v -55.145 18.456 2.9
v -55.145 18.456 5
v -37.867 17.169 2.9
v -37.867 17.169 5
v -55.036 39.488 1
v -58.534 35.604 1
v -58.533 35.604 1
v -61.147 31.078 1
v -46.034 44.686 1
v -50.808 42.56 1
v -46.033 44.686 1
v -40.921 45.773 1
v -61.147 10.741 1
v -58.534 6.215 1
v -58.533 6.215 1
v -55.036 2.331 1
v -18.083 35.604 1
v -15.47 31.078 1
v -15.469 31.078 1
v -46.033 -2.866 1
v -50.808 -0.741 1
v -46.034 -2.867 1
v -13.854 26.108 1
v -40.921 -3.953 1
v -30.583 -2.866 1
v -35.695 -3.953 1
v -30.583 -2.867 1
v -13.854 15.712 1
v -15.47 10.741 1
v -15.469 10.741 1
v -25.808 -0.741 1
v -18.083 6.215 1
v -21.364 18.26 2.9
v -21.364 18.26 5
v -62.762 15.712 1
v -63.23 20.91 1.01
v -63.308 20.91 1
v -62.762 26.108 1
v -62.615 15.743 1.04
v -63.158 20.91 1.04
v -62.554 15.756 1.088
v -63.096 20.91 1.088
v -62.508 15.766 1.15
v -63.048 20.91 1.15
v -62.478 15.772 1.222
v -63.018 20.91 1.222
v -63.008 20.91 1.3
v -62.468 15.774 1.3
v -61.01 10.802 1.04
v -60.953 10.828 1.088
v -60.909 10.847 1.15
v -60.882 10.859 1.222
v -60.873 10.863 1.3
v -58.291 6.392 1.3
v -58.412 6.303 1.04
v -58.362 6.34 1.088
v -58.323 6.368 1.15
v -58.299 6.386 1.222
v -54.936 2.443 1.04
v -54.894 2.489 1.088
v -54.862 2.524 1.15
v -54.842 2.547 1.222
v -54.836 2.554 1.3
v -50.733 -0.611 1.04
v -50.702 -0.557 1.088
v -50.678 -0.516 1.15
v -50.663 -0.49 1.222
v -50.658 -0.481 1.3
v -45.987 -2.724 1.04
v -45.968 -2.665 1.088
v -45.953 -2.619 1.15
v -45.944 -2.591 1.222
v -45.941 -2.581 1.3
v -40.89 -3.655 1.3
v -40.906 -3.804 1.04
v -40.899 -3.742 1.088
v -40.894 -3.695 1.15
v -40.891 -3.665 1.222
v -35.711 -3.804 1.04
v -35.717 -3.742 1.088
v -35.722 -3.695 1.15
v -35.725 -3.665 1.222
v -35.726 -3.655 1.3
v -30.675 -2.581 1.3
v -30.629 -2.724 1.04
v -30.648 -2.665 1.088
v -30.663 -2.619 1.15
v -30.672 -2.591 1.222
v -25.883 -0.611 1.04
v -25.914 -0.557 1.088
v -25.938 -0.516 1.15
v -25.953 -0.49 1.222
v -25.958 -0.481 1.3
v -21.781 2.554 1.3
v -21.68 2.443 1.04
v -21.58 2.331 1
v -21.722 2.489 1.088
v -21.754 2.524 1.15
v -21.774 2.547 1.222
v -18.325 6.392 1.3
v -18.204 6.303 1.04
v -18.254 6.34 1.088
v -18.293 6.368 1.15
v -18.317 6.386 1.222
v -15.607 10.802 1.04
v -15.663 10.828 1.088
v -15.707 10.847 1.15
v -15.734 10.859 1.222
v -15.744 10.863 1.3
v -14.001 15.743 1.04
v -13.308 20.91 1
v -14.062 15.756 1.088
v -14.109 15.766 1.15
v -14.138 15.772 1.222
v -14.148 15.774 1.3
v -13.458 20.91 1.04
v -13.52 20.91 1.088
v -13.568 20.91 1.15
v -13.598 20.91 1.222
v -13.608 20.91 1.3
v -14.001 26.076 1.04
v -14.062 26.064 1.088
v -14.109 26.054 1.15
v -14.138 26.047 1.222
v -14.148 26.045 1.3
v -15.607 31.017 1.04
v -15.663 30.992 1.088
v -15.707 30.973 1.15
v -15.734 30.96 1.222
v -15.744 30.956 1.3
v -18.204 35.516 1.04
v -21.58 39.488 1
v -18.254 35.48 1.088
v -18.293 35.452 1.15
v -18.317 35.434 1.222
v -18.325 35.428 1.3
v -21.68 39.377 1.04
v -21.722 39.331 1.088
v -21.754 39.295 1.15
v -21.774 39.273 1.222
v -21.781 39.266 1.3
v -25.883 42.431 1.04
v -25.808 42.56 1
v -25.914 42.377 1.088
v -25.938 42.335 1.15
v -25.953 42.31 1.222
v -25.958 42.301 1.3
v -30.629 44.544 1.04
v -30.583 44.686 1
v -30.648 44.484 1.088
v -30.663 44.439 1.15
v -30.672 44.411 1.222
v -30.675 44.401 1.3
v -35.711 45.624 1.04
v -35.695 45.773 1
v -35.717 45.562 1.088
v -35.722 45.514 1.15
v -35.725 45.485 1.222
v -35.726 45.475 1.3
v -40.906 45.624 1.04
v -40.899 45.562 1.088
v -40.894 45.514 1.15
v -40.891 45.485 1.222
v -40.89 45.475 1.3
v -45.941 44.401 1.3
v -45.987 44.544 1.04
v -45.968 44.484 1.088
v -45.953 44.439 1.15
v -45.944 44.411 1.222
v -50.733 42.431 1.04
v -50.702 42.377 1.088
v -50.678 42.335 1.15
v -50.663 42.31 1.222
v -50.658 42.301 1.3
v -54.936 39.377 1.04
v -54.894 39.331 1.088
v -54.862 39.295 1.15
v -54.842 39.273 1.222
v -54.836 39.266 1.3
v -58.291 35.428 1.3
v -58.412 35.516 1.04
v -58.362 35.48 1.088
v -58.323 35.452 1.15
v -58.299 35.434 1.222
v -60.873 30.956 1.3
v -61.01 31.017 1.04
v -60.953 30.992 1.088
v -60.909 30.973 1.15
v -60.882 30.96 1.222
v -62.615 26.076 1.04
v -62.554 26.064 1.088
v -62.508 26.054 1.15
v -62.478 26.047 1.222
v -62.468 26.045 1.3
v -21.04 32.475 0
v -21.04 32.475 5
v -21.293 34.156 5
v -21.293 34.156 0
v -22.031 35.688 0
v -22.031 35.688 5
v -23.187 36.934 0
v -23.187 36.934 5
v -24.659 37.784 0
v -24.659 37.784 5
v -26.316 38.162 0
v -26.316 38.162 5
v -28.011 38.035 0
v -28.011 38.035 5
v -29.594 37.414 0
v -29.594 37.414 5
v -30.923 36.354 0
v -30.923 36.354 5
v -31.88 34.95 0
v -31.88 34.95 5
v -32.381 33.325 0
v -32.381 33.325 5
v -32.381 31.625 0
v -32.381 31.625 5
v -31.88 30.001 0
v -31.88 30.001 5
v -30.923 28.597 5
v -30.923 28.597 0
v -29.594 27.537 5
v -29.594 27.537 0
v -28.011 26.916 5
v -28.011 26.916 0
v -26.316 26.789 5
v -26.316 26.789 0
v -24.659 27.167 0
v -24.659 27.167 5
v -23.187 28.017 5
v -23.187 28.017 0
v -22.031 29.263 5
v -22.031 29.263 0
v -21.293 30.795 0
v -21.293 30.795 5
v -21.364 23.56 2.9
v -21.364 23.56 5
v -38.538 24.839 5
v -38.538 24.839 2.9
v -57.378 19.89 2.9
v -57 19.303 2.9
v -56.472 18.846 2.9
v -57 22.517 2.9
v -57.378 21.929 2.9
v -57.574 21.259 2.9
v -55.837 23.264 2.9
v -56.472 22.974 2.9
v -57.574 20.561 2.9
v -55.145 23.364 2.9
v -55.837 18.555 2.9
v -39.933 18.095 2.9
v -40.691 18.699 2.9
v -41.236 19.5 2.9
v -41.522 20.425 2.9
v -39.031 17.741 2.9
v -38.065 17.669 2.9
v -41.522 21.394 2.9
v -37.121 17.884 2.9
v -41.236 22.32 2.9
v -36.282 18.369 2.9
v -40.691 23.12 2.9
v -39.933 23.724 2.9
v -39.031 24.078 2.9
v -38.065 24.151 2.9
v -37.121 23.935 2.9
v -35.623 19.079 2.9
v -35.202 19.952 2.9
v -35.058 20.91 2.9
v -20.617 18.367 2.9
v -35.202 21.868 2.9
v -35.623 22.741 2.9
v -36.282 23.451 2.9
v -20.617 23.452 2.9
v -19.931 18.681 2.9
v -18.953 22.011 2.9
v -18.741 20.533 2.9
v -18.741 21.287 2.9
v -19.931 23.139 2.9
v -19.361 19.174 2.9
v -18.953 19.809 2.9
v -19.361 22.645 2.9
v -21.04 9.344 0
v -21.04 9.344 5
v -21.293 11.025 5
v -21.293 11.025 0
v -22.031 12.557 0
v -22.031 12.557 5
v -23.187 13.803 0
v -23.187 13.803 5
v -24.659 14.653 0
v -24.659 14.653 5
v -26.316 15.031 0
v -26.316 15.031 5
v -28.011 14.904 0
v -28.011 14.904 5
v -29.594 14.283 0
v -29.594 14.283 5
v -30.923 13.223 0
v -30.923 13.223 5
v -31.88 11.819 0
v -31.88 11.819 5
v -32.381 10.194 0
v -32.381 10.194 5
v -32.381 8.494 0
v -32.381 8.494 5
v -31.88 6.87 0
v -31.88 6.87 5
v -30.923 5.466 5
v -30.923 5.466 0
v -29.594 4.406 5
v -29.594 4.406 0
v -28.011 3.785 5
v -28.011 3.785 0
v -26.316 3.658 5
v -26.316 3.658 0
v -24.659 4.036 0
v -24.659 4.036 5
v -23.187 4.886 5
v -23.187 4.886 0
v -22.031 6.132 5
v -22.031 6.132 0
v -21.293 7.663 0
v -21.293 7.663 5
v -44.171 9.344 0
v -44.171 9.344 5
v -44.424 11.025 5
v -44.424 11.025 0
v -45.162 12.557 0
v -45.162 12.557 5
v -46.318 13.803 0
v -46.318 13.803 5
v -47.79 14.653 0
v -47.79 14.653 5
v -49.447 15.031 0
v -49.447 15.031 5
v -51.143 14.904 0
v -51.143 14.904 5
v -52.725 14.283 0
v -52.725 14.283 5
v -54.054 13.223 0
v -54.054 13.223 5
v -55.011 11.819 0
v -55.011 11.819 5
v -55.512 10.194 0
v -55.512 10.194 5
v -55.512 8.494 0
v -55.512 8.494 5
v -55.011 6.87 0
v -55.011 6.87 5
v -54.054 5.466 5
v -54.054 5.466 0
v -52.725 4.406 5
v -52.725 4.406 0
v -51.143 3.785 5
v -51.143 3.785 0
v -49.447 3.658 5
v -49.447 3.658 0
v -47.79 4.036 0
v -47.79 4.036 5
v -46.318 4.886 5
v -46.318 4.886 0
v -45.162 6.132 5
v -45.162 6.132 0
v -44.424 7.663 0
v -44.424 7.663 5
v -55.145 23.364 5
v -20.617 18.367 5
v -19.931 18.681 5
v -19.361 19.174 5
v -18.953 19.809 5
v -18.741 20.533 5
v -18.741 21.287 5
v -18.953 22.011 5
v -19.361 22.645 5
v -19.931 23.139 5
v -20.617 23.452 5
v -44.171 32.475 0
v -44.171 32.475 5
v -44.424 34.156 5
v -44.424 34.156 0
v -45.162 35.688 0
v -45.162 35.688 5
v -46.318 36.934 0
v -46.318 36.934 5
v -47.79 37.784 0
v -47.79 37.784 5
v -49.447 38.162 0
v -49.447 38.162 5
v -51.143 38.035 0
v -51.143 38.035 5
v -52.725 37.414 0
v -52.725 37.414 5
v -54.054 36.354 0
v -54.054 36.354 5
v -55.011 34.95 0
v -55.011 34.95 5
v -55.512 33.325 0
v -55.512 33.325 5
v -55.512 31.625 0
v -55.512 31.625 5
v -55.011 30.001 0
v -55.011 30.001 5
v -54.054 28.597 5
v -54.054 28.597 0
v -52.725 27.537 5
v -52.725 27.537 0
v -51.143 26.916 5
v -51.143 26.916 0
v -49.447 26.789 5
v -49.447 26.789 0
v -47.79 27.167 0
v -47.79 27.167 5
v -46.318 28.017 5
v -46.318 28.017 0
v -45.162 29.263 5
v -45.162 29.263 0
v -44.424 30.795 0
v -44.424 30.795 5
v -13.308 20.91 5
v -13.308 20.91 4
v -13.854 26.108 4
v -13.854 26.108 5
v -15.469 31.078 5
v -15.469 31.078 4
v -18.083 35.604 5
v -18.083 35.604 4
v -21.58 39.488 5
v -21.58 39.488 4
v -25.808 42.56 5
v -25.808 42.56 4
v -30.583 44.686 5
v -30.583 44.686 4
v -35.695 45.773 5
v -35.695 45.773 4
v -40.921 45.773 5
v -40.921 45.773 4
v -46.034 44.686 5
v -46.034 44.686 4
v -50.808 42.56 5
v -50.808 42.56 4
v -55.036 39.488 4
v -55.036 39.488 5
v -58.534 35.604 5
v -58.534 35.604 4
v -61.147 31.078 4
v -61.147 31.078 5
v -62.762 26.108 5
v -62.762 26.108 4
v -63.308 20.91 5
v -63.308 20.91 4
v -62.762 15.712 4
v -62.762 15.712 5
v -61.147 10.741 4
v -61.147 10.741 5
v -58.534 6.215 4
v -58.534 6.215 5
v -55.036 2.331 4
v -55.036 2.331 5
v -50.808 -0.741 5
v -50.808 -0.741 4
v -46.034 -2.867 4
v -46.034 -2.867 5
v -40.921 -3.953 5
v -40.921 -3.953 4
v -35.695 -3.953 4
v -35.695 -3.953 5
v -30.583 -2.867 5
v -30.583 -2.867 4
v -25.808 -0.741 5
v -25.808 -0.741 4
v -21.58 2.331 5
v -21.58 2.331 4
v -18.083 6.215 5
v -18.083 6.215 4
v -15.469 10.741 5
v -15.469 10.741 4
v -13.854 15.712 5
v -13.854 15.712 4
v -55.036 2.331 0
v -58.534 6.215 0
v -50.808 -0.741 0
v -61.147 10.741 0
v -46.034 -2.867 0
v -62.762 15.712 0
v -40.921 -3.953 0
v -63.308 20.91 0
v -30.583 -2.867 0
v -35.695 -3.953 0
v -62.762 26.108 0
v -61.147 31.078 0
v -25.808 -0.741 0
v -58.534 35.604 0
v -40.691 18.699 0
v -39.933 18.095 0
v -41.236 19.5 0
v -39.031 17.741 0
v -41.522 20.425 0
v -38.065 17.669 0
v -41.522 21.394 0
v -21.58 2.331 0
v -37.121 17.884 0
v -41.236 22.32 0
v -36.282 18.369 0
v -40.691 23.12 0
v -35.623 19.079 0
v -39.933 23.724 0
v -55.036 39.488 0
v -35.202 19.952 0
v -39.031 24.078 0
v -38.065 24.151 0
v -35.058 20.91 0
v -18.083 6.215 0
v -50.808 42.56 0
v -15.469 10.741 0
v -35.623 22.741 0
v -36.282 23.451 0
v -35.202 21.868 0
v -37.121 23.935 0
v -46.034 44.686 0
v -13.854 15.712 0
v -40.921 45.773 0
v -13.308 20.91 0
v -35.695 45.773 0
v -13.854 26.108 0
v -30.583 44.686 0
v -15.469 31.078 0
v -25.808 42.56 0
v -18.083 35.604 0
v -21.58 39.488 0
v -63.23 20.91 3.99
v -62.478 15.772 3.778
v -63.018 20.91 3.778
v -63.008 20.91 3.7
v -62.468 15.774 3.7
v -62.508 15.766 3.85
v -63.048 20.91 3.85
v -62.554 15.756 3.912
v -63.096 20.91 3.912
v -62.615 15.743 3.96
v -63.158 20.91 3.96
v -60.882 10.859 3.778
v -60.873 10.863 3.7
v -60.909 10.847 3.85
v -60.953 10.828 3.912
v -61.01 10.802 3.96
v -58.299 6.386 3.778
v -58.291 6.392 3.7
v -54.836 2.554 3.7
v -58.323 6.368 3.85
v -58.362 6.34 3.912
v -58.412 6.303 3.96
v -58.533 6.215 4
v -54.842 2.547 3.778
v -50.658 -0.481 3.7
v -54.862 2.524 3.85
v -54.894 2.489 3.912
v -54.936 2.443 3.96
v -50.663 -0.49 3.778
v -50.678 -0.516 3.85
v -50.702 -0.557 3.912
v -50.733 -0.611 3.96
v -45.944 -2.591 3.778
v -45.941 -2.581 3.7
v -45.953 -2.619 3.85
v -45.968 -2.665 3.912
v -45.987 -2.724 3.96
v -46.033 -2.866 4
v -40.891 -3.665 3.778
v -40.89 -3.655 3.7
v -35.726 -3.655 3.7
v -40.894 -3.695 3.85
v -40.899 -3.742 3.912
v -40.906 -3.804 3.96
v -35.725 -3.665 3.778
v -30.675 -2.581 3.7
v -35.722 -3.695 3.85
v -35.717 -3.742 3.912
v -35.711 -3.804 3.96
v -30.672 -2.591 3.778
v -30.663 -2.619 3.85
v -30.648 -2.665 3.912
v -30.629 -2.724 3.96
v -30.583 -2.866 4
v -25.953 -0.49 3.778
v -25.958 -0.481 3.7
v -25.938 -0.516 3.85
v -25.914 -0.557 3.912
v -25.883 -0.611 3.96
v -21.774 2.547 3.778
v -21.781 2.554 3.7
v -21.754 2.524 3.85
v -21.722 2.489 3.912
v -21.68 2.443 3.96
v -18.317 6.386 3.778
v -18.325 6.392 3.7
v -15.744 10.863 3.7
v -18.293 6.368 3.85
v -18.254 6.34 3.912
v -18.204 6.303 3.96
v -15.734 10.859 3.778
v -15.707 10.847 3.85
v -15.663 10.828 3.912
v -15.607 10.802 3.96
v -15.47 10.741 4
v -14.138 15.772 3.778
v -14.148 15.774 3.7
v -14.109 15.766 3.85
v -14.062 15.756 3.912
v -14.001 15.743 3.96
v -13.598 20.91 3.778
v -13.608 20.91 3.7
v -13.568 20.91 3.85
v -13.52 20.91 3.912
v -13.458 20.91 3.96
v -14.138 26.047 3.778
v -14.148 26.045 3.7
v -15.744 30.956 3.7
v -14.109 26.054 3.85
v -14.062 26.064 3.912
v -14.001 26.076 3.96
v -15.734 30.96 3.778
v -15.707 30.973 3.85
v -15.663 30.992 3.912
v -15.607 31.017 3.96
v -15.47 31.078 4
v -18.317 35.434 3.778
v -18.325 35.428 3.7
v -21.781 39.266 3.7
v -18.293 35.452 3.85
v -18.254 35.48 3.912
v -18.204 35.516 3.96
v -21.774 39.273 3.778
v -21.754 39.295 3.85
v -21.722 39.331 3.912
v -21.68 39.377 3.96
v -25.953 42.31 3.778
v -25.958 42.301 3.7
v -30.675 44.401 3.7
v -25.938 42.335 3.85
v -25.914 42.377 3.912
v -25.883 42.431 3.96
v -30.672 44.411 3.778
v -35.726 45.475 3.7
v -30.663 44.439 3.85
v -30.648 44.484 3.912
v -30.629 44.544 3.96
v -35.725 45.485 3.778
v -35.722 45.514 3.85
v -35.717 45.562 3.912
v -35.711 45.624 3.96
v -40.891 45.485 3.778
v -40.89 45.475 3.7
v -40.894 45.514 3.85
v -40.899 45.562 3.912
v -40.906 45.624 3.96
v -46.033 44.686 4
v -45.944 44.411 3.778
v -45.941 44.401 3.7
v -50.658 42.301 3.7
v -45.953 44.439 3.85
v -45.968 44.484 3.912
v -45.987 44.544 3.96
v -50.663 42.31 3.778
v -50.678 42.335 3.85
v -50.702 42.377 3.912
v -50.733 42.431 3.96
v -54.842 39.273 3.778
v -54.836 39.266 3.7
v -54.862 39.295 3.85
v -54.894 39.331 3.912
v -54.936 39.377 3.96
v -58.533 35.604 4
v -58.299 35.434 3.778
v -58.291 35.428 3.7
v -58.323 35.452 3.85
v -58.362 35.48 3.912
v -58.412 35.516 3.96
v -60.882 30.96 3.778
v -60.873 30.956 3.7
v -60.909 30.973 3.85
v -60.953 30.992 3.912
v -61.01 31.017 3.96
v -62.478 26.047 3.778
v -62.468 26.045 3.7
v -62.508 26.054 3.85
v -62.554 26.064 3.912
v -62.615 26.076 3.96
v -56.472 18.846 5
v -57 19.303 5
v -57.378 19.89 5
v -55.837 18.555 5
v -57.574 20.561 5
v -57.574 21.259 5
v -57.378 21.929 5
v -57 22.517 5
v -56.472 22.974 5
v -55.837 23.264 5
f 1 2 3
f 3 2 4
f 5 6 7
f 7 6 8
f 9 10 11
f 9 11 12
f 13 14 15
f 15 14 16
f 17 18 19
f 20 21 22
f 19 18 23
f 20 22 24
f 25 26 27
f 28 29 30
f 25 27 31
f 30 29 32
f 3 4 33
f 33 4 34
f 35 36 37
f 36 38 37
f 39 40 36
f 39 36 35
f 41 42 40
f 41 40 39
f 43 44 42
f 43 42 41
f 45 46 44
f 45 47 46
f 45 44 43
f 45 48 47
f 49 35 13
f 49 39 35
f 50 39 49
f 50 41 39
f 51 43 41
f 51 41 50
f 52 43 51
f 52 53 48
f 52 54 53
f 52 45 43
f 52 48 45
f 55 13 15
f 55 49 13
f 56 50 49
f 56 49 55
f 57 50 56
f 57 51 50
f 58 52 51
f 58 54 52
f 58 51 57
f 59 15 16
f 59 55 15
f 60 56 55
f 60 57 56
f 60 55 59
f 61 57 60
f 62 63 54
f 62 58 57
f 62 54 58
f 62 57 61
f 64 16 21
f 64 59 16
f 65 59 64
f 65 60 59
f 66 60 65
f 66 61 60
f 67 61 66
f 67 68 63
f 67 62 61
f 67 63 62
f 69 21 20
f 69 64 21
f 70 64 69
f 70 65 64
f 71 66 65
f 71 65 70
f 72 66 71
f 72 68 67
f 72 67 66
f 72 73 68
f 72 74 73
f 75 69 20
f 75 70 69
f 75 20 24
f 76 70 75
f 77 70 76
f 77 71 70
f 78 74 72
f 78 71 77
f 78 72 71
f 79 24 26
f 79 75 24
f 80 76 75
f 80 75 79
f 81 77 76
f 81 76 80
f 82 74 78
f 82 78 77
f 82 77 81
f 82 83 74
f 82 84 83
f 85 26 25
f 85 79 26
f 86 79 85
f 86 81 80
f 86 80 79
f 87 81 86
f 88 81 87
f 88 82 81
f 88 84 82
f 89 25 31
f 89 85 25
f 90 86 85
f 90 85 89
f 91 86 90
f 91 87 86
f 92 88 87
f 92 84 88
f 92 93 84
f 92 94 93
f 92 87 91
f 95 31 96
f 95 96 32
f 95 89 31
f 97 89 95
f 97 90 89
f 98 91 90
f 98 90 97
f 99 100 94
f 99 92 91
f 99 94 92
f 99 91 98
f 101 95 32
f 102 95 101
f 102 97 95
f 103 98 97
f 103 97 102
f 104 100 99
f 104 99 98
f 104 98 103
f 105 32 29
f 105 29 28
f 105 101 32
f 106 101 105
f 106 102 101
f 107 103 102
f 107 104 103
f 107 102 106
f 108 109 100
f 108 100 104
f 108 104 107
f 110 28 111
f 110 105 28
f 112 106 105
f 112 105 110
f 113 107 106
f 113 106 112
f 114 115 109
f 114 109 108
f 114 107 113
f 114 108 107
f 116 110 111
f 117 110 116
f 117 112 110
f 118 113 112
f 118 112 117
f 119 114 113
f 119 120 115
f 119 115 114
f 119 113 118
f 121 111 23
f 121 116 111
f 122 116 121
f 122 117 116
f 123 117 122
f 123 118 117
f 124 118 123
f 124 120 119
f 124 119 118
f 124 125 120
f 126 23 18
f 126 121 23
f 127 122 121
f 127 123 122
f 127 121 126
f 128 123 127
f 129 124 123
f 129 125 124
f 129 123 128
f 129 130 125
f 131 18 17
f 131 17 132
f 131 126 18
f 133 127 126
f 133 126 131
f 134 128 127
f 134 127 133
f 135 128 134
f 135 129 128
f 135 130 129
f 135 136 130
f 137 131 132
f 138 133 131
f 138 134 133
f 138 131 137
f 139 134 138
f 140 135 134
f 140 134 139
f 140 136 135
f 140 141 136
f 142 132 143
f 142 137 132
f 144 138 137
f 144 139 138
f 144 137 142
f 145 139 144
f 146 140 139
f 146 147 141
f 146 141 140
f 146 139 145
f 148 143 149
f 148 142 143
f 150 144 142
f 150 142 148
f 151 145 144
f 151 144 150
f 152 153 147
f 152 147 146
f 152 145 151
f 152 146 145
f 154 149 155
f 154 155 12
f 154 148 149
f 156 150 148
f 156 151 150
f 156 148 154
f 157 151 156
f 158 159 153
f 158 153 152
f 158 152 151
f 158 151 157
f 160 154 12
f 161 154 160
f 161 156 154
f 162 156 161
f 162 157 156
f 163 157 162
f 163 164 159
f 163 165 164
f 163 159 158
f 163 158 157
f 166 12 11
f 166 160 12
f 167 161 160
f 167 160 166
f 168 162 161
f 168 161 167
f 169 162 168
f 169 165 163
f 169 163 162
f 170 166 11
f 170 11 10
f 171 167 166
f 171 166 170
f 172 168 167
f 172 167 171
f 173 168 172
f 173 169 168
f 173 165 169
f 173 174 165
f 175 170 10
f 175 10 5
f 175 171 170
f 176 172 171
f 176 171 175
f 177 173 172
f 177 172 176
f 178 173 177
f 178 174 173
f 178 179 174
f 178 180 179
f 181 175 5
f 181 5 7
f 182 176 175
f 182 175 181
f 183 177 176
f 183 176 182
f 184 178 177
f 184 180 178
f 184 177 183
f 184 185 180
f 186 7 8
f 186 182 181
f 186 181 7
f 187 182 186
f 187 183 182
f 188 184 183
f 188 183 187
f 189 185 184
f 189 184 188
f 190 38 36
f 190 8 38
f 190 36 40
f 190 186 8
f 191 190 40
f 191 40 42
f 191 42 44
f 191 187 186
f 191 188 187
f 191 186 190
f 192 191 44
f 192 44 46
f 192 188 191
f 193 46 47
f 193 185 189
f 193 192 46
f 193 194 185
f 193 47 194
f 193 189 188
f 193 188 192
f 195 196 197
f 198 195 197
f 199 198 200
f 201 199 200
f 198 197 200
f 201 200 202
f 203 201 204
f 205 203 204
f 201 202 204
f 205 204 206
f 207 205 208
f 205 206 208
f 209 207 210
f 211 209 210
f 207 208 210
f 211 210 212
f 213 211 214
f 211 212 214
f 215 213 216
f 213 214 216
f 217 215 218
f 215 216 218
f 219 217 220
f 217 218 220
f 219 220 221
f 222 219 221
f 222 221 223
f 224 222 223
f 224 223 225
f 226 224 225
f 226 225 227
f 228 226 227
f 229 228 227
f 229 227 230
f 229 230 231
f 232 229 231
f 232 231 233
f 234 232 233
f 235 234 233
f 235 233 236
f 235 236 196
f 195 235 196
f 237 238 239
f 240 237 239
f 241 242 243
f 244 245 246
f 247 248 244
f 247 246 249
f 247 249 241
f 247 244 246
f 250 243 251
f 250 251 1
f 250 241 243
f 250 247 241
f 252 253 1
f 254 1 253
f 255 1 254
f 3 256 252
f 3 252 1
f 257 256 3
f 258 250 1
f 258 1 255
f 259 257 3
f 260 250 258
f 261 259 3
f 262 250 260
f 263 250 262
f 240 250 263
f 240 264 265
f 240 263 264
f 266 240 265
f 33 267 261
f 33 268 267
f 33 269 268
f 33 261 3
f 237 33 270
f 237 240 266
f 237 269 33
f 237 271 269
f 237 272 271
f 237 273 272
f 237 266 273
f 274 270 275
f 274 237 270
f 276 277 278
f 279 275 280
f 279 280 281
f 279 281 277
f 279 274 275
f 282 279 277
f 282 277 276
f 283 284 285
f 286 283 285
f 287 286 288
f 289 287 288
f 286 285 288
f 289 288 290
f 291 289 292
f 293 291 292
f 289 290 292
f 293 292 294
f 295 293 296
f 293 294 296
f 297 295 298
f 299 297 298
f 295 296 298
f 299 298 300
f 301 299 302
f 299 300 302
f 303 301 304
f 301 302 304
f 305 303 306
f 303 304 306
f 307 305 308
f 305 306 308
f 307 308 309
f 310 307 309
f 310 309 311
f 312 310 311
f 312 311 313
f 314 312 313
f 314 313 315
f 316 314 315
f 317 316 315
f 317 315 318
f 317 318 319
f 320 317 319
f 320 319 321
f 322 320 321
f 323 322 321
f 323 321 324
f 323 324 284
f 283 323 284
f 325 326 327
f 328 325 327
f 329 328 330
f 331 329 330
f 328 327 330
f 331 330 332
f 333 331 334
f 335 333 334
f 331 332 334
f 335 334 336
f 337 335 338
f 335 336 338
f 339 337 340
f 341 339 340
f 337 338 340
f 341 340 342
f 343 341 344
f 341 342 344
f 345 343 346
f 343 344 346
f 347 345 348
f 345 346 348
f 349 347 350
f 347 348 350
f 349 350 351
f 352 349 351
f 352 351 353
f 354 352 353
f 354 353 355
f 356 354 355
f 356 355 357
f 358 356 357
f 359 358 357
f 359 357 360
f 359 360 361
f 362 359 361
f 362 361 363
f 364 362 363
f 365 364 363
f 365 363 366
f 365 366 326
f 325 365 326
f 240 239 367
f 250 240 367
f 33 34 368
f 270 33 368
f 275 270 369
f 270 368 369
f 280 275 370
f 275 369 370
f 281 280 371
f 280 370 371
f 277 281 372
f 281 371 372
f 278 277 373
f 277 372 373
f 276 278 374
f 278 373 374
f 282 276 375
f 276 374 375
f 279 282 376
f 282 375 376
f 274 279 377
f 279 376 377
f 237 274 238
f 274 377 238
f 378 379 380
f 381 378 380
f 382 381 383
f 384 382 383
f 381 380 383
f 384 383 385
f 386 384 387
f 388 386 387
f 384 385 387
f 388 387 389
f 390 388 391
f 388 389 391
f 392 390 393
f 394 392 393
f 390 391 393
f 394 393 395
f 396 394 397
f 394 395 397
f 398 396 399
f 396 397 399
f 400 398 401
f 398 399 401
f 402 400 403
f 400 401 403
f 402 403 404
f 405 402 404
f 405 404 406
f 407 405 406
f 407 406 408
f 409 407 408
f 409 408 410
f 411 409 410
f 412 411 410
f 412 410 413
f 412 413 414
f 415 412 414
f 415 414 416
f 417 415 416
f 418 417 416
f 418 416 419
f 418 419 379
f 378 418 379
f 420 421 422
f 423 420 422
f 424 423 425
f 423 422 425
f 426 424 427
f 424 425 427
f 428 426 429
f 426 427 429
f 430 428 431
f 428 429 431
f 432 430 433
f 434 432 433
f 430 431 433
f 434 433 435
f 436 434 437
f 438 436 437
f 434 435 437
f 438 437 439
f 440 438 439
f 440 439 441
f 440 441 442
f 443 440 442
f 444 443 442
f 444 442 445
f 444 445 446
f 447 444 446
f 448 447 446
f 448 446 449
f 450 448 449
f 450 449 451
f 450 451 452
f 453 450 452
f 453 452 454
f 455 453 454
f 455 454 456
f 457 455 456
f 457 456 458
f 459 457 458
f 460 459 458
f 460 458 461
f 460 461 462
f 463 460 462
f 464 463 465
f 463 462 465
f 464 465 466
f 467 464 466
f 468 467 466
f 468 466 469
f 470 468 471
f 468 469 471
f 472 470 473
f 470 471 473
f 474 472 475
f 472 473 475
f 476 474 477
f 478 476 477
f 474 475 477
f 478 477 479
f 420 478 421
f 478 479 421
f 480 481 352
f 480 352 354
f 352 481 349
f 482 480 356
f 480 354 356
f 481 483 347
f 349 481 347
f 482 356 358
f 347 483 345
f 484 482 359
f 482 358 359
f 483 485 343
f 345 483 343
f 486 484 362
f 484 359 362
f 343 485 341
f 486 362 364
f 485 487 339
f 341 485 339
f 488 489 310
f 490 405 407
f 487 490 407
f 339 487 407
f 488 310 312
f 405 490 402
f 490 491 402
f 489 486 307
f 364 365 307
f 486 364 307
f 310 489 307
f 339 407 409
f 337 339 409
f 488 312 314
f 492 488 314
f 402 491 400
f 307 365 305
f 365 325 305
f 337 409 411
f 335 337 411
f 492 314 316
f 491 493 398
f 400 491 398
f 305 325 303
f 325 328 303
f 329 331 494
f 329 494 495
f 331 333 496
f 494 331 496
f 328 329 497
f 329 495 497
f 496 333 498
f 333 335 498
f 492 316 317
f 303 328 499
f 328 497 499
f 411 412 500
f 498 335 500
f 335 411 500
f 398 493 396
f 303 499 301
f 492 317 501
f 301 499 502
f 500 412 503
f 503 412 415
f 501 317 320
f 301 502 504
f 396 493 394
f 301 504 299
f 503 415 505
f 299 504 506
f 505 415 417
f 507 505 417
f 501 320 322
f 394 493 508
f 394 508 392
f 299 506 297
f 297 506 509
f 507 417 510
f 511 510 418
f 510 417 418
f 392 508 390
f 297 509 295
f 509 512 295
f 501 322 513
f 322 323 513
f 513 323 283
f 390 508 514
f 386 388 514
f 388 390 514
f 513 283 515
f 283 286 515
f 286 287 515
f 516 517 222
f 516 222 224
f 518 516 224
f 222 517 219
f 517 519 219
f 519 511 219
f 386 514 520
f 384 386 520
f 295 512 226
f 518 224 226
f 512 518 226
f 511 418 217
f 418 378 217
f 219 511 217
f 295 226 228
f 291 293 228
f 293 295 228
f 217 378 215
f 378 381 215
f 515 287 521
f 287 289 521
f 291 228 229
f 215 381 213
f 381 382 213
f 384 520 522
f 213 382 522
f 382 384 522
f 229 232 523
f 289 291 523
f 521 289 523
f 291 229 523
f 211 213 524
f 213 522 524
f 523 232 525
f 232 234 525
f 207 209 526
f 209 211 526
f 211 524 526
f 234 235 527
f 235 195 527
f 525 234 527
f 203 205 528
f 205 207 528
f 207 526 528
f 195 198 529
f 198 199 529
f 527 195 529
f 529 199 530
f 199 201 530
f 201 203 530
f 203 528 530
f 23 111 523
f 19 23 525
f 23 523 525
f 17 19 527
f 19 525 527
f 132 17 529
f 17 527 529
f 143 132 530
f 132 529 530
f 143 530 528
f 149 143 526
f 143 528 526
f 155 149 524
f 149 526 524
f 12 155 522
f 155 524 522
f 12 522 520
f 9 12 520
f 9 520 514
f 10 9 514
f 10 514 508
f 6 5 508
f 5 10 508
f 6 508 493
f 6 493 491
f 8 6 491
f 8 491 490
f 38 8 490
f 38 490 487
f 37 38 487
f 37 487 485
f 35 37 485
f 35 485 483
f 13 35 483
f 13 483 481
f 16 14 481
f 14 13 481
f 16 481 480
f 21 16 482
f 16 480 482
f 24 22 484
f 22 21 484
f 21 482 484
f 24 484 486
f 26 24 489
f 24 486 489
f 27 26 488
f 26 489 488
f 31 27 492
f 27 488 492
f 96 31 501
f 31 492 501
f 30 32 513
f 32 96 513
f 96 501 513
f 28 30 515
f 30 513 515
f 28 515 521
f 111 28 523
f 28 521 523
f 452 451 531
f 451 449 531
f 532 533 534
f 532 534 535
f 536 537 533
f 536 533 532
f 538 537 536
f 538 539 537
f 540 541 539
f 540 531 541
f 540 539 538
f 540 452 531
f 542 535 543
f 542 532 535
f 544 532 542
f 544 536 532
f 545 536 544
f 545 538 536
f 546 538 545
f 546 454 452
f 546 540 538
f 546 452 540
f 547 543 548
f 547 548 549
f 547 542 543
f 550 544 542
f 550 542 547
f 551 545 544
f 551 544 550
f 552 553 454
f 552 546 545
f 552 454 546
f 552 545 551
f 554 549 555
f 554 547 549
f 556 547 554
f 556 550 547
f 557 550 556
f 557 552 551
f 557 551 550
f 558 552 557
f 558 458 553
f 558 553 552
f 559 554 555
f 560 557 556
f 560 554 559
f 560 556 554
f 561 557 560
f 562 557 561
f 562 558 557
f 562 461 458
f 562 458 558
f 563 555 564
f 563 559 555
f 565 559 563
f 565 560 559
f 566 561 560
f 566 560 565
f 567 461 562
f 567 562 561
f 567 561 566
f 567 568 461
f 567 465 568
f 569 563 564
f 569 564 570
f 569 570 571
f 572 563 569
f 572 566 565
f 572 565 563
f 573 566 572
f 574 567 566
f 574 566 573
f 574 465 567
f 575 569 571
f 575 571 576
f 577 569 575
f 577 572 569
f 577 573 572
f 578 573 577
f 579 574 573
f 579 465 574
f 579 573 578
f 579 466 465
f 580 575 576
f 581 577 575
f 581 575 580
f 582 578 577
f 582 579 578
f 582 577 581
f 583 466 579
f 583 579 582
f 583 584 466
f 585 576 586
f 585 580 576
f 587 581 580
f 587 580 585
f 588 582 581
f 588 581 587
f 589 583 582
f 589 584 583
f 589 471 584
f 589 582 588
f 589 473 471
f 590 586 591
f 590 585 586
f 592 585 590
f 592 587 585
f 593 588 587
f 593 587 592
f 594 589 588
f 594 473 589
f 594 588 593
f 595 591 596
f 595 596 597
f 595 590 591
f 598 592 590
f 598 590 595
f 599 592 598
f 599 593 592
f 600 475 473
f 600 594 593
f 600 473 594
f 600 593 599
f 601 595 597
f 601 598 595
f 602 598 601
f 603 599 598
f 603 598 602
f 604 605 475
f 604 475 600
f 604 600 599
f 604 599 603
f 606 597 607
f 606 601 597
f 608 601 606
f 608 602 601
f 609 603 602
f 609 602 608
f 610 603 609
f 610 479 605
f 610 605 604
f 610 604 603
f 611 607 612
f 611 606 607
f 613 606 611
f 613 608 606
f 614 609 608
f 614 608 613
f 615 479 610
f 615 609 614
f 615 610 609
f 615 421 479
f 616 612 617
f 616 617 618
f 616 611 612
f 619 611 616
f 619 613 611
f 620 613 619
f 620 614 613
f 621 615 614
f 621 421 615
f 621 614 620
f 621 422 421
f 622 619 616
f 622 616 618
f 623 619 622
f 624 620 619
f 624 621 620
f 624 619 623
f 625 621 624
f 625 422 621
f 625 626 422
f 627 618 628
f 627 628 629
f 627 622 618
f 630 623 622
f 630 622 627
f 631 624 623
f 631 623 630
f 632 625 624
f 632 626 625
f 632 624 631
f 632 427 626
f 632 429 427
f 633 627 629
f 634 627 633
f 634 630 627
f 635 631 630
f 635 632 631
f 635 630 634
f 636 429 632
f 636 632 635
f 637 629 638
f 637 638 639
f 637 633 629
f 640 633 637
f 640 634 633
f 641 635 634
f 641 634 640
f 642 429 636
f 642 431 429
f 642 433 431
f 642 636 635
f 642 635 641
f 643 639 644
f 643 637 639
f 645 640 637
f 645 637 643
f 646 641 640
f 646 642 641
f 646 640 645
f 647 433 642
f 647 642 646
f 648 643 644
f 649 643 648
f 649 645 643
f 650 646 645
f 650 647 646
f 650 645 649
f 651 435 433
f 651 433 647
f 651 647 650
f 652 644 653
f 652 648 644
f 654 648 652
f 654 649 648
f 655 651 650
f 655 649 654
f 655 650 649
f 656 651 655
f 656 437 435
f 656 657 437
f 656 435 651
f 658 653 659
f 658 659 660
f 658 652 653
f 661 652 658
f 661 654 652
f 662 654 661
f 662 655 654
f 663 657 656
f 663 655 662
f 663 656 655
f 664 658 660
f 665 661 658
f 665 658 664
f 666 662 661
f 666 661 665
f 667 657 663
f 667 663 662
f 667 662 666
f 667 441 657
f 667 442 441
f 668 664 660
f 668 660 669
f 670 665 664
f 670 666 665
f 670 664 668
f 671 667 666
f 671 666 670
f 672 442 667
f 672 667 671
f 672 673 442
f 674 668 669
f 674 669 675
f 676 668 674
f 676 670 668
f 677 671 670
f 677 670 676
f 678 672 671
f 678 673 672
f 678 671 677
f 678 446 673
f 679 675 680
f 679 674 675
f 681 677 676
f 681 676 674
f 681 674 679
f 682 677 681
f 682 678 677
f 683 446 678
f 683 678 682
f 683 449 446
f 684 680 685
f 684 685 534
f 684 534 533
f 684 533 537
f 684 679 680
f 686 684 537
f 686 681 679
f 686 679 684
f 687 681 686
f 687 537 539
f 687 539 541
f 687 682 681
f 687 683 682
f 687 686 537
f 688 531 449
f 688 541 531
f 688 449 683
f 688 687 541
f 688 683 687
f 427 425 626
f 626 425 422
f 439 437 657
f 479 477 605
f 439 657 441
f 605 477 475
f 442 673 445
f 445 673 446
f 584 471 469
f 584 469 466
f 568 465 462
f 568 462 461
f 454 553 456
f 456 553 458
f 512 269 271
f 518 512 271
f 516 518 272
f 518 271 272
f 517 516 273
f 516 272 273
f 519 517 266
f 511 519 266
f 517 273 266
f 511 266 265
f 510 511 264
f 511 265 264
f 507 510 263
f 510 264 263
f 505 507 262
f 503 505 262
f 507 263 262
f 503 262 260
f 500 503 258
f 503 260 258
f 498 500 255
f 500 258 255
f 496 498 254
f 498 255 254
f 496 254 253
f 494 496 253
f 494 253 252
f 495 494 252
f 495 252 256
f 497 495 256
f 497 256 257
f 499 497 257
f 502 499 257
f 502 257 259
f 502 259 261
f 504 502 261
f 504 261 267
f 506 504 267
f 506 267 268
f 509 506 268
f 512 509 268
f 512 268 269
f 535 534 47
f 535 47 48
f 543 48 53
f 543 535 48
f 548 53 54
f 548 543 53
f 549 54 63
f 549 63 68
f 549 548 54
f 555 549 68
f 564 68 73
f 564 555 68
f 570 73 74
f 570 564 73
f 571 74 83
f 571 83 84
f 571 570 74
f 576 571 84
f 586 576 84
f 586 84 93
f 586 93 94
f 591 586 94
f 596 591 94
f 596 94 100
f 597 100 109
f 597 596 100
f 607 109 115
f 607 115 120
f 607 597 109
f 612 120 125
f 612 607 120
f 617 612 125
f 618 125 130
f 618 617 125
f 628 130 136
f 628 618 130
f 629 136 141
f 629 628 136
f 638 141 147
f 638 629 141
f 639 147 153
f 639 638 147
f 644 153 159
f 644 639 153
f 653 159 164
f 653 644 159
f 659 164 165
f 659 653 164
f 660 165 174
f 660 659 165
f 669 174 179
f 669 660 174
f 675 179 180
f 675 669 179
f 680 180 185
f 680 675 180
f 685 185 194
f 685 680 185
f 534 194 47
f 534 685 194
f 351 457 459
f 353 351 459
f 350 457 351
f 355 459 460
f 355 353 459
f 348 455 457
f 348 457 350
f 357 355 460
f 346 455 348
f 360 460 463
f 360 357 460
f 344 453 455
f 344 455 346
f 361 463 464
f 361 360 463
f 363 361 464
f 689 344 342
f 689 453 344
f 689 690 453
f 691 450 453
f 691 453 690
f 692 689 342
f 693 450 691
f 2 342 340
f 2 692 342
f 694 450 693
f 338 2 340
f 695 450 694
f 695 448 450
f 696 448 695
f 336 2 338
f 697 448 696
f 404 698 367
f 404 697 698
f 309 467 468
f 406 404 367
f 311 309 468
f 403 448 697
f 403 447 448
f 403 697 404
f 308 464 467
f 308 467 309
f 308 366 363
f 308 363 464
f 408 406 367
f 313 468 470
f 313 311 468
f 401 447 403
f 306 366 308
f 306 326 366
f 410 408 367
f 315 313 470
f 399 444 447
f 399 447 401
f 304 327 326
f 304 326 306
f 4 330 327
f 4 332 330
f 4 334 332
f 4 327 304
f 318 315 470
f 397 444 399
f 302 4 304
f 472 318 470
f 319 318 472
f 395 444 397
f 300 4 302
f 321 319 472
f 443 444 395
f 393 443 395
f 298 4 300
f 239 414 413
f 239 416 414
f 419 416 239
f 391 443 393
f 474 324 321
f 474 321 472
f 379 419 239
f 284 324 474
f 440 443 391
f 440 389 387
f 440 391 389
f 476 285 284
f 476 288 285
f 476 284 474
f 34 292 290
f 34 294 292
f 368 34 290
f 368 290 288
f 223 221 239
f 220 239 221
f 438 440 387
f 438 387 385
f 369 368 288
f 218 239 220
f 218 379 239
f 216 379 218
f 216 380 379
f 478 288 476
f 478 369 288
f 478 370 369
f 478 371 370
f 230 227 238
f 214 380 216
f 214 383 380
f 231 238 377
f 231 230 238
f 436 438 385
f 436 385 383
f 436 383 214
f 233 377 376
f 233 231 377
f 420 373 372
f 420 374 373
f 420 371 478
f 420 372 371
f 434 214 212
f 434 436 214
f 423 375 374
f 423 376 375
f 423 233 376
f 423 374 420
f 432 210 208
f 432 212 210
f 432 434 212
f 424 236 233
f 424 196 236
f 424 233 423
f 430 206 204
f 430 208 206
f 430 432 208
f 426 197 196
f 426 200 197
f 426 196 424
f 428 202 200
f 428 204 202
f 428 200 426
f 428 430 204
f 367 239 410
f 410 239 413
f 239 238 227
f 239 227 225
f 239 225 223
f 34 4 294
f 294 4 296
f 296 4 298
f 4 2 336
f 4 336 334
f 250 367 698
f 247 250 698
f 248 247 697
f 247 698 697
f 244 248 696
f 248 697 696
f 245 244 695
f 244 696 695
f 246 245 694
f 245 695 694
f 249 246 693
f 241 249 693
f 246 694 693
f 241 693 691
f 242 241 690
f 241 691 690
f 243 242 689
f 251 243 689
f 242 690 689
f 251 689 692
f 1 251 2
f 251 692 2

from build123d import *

# Parameters (mm, degrees)
SKETCH1_R           = 25
BOSS_EXTRUDE1_DEPTH = 5
FILLET1_R           = 0.3
CUT_EXTRUDE1_DEPTH  = 2.1
SKETCH15_R          = 3.25
CUT_EXTRUDE2_DEPTH  = 10.1
SKETCH18_R          = 5.702447769
CUT_EXTRUDE4_DEPTH  = 10.1


with BuildPart() as part:
    # Sketch1 → Boss-Extrude1 (new body)
    with BuildSketch(Plane.XY):
        with Locations((-38.308088976, 20.909831899)):
            Circle(SKETCH1_R)
    extrude(amount=BOSS_EXTRUDE1_DEPTH)

    # Sketch12 → Cut-Revolve1 (revolve, cut)
    with BuildSketch(Plane.ZY.offset(38.308088976), mode=Mode.PRIVATE) as cut_revolve1_sk:
        Polygon((2.5, 45.909831899), (4, 45.909831899), (4, 45.609831899), (2.5, 45.609831899), (1, 45.609831899), (1, 45.909831899), align=None)
    revolve(cut_revolve1_sk.sketch.rotate(Axis((-38.308088976, 20.909831899, 0), (0, 0, 1)), 90), axis=Axis((-38.308088976, 20.909831899, 0), (0, 0, 1)), mode=Mode.SUBTRACT)

    # Fillet1
    fillet1_edges = [part.edges().sort_by_distance(p)[0] for p in [
        (-13.608088976, 20.909831899, 1),
        (-13.608088976, 20.909831899, 4),
    ]]
    fillet(fillet1_edges, radius=FILLET1_R - 0.0001)  # a hair under: the kernel refuses the full size

    # Sketch13 → Cut-Extrude1 (cut)
    with BuildSketch(Plane.XY.offset(5)):
        with BuildLine():
            Line((-38.537840804, 24.839400282), (-55.145400599, 23.363683745))
            ThreePointArc((-55.145400599, 23.363683745), (-57.599252444, 20.909831899), (-55.145400599, 18.455980054))
            Line((-55.145400599, 18.455980054), (-37.86715674, 17.168664797))
            Line((-37.86715674, 17.168664797), (-21.363574888, 18.259831899))
            ThreePointArc((-21.363574888, 18.259831899), (-18.713574888, 20.909831899), (-21.363574888, 23.559831899))
            Line((-21.363574888, 23.559831899), (-38.537840804, 24.839400282))
        make_face()
    extrude(amount=-CUT_EXTRUDE1_DEPTH, mode=Mode.SUBTRACT)

    # Sketch15 → Cut-Extrude2 (cut)
    with BuildSketch(Plane.XY.offset(2.9)):
        with Locations((-38.308088976, 20.909831899)):
            Circle(SKETCH15_R)
    extrude(amount=-CUT_EXTRUDE2_DEPTH, mode=Mode.SUBTRACT)

    # Sketch18 → Cut-Extrude4 (cut)
    with BuildSketch(Plane.XY.offset(5)):
        with Locations((-26.7425748, 32.475346075)):
            Circle(SKETCH18_R)
        with Locations((-26.7425748, 9.344317724)):
            Circle(SKETCH18_R)
        with Locations((-49.873603152, 9.344317724)):
            Circle(SKETCH18_R)
        with Locations((-49.873603152, 32.475346075)):
            Circle(SKETCH18_R)
    extrude(amount=-CUT_EXTRUDE4_DEPTH, mode=Mode.SUBTRACT)


solid = part.part
